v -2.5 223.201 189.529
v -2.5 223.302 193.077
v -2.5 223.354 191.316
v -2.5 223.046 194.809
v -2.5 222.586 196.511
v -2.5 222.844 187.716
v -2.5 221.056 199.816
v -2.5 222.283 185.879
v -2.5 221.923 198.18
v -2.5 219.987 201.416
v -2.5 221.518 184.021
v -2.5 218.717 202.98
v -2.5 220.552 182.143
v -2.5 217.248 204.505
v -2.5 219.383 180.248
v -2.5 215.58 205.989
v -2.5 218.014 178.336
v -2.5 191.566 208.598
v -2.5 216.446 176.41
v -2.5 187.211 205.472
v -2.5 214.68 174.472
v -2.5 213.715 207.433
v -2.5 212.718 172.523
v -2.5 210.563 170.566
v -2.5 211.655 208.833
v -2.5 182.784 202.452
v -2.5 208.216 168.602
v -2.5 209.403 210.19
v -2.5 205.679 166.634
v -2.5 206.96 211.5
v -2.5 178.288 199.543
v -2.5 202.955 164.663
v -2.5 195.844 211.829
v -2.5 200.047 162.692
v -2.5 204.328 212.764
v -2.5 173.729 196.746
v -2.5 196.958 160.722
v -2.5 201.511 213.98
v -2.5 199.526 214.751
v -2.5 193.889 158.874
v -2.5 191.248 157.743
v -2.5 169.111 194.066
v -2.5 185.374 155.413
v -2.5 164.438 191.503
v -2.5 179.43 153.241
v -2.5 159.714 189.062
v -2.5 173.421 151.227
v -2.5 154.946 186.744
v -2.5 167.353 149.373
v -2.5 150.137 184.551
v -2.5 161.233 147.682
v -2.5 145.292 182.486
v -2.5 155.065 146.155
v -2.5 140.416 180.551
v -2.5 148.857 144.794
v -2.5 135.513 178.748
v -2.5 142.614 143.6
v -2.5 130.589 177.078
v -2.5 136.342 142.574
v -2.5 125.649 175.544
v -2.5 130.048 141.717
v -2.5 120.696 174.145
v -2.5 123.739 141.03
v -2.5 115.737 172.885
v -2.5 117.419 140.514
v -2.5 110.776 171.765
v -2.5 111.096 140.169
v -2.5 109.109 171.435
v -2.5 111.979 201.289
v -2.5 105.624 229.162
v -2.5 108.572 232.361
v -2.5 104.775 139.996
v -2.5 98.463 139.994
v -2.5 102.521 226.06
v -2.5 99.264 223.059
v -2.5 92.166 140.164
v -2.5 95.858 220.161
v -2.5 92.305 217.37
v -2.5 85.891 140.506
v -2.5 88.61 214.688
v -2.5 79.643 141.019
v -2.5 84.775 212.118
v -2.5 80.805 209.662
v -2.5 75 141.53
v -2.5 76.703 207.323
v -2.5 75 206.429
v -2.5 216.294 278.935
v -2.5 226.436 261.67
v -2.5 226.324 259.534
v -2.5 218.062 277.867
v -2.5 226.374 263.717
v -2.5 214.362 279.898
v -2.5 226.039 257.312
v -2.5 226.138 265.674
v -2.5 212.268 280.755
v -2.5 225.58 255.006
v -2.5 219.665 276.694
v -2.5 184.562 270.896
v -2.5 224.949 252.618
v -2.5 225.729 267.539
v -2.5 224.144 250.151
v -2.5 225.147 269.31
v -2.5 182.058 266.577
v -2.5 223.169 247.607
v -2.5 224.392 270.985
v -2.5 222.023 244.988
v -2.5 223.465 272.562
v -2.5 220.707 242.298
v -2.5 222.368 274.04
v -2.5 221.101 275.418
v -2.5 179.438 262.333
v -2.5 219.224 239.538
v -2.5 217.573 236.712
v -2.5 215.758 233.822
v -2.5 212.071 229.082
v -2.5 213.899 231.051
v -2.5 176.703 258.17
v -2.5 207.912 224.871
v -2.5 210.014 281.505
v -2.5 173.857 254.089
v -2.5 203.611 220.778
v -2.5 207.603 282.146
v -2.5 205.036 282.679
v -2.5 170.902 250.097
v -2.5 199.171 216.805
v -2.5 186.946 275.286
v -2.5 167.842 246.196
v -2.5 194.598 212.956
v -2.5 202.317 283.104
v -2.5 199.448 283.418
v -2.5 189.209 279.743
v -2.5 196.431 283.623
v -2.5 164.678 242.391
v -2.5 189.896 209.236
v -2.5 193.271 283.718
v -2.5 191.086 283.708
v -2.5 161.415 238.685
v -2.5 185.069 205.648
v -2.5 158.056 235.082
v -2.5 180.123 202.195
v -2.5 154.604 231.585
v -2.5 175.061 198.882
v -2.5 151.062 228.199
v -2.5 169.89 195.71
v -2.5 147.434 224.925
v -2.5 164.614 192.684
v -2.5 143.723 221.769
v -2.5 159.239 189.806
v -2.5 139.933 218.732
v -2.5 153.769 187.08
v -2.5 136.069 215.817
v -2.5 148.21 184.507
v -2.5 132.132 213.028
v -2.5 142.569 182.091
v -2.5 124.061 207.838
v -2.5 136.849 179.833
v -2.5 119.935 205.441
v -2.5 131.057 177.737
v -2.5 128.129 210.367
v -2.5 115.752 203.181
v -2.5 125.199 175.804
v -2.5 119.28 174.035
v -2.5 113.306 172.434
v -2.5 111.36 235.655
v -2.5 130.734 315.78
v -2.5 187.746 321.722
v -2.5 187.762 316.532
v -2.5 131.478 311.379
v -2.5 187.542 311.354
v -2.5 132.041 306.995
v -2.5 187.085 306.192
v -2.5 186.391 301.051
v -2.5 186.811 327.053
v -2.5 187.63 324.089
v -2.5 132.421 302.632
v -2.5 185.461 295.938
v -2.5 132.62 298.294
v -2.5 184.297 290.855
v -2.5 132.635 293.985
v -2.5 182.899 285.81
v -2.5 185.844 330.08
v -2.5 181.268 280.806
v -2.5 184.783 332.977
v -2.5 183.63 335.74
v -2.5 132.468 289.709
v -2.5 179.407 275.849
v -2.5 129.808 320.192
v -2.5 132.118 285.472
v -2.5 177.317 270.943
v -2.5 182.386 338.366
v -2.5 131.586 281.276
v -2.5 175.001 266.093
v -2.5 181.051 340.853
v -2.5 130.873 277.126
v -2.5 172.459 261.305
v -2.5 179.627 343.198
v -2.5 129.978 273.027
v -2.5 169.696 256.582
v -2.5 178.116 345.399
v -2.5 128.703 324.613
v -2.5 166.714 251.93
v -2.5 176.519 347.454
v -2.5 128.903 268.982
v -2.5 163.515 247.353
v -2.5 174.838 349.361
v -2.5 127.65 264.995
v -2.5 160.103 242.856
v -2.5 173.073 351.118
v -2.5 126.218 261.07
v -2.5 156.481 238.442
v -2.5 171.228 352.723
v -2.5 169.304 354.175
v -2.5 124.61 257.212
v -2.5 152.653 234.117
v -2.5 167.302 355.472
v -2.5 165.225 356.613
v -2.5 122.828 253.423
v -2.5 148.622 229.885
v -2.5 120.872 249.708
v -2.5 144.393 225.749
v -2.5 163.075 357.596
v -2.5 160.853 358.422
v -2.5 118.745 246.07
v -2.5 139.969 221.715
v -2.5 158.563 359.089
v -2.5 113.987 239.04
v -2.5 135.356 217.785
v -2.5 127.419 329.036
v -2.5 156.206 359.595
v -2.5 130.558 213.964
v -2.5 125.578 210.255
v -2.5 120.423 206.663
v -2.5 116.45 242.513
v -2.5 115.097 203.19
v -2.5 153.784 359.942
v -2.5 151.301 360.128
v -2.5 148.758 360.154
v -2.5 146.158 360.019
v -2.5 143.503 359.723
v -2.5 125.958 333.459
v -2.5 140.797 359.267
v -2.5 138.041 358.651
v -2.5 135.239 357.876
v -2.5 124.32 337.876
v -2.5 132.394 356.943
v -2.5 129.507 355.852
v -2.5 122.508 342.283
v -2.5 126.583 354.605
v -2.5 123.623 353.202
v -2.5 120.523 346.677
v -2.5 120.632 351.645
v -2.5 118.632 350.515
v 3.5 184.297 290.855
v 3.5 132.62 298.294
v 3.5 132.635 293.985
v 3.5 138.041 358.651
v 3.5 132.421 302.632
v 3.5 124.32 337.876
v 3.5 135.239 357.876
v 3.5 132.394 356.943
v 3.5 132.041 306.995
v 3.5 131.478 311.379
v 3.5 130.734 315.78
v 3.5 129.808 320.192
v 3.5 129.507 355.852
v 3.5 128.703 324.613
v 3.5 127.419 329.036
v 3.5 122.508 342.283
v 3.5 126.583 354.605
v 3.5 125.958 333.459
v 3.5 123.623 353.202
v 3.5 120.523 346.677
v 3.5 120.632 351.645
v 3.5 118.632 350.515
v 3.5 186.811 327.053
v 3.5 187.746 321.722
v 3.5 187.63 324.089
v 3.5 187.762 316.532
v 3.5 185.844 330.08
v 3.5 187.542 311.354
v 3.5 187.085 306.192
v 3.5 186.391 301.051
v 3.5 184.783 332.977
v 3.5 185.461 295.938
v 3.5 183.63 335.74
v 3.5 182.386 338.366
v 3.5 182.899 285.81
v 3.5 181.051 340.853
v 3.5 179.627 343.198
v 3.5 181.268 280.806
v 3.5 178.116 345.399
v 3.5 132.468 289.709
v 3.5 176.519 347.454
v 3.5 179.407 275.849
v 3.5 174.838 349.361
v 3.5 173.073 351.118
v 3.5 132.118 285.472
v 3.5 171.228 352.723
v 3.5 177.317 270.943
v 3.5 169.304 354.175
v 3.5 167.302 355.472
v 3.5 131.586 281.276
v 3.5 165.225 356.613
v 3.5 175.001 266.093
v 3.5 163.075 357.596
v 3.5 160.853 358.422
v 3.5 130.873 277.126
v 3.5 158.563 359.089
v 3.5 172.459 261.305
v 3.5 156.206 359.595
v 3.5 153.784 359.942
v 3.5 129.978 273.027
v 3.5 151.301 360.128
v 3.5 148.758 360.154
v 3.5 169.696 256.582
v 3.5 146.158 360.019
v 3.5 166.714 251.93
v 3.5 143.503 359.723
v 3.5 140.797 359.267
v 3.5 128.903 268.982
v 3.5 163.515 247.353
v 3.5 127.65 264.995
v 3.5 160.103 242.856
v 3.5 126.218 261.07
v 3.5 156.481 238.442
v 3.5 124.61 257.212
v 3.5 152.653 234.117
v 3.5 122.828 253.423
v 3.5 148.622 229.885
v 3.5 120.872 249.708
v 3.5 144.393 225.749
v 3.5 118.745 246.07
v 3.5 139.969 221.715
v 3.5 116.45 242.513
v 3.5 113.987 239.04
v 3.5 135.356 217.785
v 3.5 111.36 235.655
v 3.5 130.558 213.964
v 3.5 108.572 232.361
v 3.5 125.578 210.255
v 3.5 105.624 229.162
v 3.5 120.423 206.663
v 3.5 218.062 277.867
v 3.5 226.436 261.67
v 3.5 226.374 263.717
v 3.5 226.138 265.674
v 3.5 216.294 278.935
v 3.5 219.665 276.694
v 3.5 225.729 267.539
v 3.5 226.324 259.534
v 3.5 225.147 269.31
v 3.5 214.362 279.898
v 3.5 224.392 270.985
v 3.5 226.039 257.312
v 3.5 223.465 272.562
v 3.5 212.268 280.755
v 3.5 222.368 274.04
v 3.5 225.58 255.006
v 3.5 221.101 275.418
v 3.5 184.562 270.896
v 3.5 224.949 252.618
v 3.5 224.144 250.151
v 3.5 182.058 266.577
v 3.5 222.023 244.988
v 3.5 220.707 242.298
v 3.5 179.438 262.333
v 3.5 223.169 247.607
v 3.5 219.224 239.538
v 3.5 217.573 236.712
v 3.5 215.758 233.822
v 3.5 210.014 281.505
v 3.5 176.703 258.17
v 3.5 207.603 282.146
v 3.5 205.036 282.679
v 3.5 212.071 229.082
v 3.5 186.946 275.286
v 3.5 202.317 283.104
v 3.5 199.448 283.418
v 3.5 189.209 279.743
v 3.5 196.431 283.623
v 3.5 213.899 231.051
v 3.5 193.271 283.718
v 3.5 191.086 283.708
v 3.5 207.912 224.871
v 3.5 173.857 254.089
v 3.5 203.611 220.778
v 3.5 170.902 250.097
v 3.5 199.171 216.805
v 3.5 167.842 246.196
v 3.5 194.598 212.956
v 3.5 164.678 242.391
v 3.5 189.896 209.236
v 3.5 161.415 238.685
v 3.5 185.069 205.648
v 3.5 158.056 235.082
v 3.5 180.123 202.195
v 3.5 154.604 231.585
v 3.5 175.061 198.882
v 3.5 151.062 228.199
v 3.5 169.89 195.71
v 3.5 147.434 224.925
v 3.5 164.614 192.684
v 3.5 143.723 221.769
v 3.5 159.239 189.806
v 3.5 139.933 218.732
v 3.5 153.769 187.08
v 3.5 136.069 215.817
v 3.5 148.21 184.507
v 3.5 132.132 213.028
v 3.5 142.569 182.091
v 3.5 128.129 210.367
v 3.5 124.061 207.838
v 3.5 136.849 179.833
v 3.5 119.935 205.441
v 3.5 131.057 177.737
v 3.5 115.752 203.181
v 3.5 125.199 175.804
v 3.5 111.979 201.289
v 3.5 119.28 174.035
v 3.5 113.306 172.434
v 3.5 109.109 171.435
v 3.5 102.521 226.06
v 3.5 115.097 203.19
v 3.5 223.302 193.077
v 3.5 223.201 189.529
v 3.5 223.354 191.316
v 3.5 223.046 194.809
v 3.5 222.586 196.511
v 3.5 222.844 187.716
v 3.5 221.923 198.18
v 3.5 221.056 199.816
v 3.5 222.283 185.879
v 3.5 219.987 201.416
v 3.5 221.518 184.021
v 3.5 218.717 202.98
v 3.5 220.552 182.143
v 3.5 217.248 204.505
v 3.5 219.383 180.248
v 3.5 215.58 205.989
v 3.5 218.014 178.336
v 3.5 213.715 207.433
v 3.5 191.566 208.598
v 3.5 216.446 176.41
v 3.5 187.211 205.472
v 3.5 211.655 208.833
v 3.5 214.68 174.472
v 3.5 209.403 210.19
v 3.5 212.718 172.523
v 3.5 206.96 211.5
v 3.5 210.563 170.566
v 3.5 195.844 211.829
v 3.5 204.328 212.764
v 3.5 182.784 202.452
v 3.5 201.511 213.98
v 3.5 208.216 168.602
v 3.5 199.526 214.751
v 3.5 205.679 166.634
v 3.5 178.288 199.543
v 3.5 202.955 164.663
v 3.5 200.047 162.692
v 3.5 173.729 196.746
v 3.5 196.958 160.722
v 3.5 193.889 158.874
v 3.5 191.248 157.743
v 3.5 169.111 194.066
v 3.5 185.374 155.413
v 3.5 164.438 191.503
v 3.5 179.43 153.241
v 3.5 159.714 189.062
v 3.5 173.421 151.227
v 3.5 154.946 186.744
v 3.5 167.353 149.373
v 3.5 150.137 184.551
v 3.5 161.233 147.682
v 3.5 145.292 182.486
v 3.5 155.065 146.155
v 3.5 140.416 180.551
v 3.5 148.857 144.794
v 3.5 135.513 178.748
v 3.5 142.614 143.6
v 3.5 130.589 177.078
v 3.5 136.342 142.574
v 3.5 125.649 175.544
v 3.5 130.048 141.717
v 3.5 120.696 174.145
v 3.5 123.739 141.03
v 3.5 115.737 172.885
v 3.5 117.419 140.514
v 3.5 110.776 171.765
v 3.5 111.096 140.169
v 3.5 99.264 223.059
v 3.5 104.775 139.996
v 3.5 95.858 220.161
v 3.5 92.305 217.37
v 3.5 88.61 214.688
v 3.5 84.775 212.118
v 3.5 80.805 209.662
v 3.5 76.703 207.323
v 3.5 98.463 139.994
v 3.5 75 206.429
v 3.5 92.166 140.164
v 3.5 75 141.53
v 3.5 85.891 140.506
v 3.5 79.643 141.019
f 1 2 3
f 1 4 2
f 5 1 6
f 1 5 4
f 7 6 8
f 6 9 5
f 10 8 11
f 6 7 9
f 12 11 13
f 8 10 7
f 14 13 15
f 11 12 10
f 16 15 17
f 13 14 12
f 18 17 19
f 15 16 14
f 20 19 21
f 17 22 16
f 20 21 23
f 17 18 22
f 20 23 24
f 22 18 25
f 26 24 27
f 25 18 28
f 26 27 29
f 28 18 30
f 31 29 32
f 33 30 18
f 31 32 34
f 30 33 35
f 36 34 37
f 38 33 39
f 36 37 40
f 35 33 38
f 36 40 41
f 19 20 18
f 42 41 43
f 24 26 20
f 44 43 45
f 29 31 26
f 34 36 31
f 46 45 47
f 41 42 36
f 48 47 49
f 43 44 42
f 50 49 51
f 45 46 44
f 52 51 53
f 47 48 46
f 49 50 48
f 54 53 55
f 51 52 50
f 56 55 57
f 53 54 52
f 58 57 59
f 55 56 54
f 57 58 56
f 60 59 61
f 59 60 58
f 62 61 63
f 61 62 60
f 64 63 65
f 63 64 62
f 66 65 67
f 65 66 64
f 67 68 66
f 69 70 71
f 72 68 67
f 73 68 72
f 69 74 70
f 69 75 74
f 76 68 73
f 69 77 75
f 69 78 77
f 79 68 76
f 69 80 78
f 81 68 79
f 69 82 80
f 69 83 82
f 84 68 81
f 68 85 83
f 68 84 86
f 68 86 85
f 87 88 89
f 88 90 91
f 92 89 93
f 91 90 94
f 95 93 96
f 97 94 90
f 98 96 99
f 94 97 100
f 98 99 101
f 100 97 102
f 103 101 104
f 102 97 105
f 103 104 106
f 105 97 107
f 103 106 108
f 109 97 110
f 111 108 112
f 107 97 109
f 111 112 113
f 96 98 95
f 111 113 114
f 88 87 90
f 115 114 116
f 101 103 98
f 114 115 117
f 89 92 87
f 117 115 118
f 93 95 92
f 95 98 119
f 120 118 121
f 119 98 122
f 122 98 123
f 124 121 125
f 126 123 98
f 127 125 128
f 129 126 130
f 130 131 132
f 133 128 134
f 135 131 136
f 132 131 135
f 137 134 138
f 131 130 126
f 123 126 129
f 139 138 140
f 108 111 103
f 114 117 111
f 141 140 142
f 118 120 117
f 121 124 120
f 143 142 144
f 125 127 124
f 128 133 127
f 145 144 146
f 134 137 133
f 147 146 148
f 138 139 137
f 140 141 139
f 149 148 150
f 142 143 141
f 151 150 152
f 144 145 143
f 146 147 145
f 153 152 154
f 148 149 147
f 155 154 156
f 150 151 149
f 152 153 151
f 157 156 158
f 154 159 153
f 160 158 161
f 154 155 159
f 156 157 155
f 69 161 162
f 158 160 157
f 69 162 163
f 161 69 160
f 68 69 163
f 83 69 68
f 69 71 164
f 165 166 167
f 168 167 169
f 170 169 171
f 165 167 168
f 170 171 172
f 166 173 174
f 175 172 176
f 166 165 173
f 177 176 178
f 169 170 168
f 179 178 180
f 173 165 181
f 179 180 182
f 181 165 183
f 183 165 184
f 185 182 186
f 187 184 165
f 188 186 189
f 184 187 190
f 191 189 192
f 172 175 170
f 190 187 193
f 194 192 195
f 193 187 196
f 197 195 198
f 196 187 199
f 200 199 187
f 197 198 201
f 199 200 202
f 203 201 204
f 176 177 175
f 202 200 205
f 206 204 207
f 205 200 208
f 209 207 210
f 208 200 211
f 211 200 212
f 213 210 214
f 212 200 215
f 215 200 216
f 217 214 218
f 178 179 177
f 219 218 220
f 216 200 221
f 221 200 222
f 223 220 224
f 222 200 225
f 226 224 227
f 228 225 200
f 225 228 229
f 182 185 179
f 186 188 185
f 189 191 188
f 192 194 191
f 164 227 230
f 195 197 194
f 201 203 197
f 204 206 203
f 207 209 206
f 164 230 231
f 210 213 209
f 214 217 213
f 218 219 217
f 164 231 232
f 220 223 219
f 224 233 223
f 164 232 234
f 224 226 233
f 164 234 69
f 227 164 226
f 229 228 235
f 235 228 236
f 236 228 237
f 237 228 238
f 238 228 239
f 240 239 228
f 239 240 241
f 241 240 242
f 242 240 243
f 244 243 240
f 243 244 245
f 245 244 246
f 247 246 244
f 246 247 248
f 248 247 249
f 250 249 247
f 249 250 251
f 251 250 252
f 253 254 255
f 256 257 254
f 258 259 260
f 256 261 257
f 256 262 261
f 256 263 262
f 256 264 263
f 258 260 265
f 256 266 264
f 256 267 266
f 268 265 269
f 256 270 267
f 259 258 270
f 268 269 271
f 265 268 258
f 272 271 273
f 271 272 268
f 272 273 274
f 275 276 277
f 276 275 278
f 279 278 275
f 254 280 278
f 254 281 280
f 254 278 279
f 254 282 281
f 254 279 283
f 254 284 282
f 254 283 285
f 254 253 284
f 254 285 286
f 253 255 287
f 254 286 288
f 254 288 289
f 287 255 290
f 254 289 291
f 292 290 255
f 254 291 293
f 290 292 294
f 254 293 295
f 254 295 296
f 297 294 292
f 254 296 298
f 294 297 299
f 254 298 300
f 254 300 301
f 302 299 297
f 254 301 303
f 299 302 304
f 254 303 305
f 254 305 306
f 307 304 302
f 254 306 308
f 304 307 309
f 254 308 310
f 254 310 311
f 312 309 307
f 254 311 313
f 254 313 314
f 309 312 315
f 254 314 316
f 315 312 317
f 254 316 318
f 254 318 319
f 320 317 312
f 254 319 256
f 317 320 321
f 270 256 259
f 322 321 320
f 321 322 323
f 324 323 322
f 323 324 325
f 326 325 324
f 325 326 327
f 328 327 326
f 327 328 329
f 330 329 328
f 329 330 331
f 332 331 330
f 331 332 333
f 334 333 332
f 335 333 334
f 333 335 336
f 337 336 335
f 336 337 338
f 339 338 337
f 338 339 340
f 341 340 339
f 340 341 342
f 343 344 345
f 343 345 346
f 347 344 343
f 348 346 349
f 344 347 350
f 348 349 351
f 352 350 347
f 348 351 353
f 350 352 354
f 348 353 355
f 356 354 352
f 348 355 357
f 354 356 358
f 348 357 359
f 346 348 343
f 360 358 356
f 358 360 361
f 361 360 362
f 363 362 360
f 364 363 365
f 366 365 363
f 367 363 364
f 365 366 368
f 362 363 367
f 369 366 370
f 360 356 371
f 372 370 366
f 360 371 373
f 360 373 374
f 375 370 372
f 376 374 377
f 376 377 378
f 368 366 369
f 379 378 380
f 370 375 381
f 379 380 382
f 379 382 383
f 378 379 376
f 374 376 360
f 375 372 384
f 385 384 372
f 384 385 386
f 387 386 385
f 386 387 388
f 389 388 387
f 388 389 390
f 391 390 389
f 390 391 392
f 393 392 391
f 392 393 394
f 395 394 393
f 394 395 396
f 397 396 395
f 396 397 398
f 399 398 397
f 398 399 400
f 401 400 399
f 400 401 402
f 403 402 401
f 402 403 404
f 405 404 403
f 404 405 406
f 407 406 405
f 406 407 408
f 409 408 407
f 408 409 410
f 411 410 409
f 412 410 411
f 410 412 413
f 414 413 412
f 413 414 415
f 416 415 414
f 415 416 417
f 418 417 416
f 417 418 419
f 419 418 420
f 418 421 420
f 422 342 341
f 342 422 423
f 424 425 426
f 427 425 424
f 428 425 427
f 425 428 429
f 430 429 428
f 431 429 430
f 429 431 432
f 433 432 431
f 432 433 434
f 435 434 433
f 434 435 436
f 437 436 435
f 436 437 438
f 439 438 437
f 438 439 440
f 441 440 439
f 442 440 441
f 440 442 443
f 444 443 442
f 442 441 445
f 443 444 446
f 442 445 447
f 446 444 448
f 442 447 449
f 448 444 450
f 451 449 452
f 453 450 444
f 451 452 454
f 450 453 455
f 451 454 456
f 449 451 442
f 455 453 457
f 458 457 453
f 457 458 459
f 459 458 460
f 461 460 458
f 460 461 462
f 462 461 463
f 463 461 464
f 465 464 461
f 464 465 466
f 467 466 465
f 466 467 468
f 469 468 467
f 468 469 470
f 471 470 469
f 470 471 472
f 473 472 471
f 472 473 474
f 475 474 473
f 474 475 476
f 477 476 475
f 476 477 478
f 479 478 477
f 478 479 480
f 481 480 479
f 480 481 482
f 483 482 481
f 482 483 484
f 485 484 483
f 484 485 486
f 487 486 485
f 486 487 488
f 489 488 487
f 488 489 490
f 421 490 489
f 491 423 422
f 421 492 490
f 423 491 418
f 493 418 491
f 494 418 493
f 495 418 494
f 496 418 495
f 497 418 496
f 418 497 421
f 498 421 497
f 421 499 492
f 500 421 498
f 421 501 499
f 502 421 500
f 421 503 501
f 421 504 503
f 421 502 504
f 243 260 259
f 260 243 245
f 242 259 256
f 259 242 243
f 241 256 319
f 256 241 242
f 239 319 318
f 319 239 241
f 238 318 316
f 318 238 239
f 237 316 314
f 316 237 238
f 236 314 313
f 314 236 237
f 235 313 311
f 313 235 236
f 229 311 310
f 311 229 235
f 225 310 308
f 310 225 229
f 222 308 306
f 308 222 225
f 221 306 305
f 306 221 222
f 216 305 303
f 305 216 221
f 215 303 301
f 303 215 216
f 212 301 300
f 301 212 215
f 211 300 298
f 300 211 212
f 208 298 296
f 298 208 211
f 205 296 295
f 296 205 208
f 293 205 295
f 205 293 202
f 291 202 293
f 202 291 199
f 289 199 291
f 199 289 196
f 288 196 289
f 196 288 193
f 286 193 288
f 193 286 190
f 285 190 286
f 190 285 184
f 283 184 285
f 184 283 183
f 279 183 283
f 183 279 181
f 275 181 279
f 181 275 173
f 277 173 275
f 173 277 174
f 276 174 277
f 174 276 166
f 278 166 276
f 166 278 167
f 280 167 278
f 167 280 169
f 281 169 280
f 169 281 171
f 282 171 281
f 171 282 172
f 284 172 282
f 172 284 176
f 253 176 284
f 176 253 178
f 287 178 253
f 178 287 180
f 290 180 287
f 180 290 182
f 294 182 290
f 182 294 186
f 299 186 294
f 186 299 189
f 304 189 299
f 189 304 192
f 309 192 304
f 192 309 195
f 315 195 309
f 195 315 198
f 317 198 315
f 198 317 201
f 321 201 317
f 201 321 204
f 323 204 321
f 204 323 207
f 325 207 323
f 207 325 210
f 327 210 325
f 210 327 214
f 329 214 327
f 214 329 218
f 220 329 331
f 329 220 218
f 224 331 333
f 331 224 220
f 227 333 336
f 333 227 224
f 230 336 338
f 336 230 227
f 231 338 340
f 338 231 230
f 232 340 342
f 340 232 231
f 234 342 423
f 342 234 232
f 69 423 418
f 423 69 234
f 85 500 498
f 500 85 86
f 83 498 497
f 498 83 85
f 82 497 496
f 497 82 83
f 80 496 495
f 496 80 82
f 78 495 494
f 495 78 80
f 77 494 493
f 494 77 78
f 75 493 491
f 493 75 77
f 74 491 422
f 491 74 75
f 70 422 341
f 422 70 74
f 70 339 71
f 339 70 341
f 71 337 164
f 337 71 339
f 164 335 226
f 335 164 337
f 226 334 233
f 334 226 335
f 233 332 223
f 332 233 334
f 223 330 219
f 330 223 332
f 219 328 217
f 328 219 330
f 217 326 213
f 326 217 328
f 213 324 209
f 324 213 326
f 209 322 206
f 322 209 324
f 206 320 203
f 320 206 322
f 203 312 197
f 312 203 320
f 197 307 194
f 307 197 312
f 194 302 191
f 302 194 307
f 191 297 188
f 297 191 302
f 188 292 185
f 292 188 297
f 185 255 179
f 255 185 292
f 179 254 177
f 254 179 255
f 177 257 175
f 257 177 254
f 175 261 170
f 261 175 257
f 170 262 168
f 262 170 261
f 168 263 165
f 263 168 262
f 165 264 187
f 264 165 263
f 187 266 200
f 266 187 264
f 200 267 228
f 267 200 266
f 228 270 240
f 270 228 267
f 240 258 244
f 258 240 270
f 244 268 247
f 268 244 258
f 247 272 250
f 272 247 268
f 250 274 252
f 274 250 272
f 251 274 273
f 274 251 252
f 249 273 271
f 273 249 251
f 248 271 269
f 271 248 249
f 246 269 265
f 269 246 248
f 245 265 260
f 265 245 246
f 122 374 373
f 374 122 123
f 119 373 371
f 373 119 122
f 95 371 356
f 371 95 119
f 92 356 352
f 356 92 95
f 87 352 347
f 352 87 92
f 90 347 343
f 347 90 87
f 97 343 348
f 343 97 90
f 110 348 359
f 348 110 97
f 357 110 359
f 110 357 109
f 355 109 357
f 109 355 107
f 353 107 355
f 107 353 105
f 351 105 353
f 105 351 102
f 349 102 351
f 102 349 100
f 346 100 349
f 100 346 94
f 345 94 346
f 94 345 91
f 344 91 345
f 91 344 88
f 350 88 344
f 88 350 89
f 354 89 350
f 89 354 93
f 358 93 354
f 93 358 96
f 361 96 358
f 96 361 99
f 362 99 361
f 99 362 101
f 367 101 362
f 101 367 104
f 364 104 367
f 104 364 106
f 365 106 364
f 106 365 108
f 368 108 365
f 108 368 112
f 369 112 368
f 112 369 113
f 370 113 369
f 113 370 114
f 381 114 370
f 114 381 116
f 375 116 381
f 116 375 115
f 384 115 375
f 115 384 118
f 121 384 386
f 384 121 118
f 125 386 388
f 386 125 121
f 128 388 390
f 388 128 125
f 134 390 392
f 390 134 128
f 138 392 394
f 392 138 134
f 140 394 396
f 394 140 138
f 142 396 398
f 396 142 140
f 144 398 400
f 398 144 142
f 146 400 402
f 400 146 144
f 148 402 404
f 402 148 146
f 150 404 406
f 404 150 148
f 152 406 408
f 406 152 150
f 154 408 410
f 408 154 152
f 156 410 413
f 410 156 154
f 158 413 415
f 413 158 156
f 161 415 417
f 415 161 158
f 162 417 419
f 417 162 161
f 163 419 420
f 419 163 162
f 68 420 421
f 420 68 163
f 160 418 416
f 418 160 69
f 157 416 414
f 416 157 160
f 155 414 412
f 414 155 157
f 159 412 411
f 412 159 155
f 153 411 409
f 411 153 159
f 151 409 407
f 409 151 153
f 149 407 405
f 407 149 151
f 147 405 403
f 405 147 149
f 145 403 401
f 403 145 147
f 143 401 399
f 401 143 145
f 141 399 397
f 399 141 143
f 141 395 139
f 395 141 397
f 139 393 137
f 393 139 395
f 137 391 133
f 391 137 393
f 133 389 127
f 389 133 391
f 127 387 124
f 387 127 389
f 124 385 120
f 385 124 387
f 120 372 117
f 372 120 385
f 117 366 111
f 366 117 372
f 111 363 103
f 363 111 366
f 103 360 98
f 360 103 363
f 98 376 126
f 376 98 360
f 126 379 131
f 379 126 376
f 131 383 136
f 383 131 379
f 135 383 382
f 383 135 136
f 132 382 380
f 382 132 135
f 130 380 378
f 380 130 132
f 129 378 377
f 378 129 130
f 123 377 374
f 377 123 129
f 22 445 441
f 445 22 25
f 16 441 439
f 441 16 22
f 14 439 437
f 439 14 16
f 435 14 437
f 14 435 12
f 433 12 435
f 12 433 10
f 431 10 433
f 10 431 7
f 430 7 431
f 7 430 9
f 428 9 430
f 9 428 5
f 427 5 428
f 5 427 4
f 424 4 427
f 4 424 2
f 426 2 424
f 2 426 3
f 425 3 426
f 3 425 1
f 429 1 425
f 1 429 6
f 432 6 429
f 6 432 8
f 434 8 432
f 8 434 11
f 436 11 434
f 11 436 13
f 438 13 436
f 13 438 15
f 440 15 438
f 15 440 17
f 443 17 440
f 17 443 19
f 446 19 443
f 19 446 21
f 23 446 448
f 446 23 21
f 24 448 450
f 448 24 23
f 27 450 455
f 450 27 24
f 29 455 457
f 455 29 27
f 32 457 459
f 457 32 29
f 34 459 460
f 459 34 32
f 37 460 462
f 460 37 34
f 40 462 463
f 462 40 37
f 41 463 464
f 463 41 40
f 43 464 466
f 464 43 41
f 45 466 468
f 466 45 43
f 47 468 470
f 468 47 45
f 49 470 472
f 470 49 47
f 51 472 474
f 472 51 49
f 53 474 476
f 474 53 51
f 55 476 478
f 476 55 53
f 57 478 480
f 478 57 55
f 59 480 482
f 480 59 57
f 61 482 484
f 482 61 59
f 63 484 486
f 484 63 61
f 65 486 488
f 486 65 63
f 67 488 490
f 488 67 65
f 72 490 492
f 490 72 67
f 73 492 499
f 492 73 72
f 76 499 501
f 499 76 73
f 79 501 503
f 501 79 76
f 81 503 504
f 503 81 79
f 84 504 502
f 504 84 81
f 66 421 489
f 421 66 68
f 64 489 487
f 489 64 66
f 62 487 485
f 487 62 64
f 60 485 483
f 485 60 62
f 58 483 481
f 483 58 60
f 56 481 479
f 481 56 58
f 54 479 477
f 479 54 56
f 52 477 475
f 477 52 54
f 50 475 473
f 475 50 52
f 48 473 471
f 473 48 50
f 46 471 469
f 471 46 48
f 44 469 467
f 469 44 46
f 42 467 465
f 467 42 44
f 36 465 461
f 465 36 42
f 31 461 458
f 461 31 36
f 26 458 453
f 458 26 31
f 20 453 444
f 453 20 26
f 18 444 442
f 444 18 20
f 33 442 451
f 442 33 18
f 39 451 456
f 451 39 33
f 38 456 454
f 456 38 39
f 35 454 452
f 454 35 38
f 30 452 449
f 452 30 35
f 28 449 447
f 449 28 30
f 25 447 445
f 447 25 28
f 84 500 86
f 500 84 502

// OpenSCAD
// file: EschaStaffMaster.scad
PipeDiameter = 28;
PipeRadius = PipeDiameter/2;

module WedgeRemoval45degree()
{
    linear_extrude(height=15)
    {
        polygon([[0,0],[0,1],[1,0]]);
    }
}

module FeatherPrimitive()
{
    mirror([0,1,1])
    rotate([0,-270,0])
linear_extrude(height=6)
{    
intersection()
{
    union()
    {
intersection()
{
    square([100,100]);
    
    
difference()
{
    circle(r=50,center=true,$fn=200);
    scale([0.65,0.85,1]) circle(r=50,center=true,$fn=200);
    
}

}
translate([41.2,0,0]) scale([1,0.75,1]) circle(d=17.5,center=true,$fn=200);
    }
    scale([0.75,0.8,1])circle(r=60,center=true,$fn=200);
    //translate([0,15,0])scale([0.75,0.8,1])circle(r=60,center=true,$fn=200);
    translate([5,46,0])rotate([0,0,45])scale([0.25,0.8,1])circle(r=60,center=true,$fn=200);
}
}
}

module EschaStaffCenterJewel()
{
    difference()
    {
    render()
    {
        minkowski()
        {
            union()
            {
    InnerRadius = PipeRadius+2;
    OuterRadius = PipeRadius+6;
    translate([0,0,-22.5])cylinder(h=25,r1=InnerRadius,r2=OuterRadius,center=true,$fn=200);
    cylinder(h=20,r=OuterRadius,center=true,$fn=200);
    translate([0,0,22.5]) cylinder(h=25,r1=OuterRadius,r2=InnerRadius,center=true,$fn=200); 
            }
            sphere(r=5,$fn=50);
        }
    }
    scale([1.05,1.05,1.05]) EschaStaffCircularHead();
    }
}

module EschaStaffCircularHead()
{
    HeadRadius = 180/2;
    HeadRadiusInner = HeadRadius-8;
    HeadRadiusOuter = HeadRadius+8;
    union()
    {
        difference()
        {
            translate([0,0,HeadRadius-3]) rotate([0,90,0]) cylinder(h=10,r=HeadRadiusOuter,center=true,$fn=256);
            translate([0,0,HeadRadius-3]) rotate([0,90,0]) cylinder(h=10+1,r=HeadRadiusInner,center=true,$fn=256);
            translate([0,HeadRadius-3,HeadRadius-3]) rotate([45,0,0]) cube([20,120,120],center=true);
            translate([0,HeadRadius-3,HeadRadius+40]) rotate([65,0,0]) cube([20,120,120],center=true);
            translate([-6,40,-9]) cube([2,2,60]);
            translate([-6,44,-9]) cube([2,2,60]);
            translate([-6,36,-9]) cube([2,2,60]);
            translate([-6,-40,-9]) cube([2,2,60]);
            translate([-6,-44,-9]) cube([2,2,60]);
            translate([-6,-36,-9]) cube([2,2,60]);
            translate([4,40,-9]) cube([2,2,60]);
            translate([4,44,-9]) cube([2,2,60]);
            translate([4,36,-9]) cube([2,2,60]);
            translate([4,-40,-9]) cube([2,2,60]);
            translate([4,-44,-9]) cube([2,2,60]);
            translate([4,-36,-9]) cube([2,2,60]);
            // Use as a position guide when assembly.
            translate([5.2,0,0]) cube([1,PipeDiameter-1,40],center=true);
        }
        translate([0,64.75,24.5]) rotate([0,90,0]) cylinder(d=16,h=10,center=true,$fn=256);
        translate([0,39,168]) rotate([0,90,0]) cylinder(d=16,h=10,center=true,$fn=256);
        translate([5,-25,-100])
        scale([1,1.5,3]) 
        rotate([90,0,270])
        linear_extrude(height=10)
        {
            intersection()
            {
                difference()
                {
                    circle(r=80,$fn=256);
                    scale([1.2,0.8,1]) circle(r=80,$fn=256);
                    translate([0,-100,0]) square([200,200],center=true);
                    translate([-60,100,0]) square([200,100],center=true);     
                }
                translate([20,45,0]) circle(r=40,$fn=256);
            }
        }
    }
}

module EschaStaffSilverCollar()
{
    InnerRadius = PipeRadius+14;
    OuterRadius = PipeRadius+18;
    difference()
    {
        translate([0,0,-45]) cylinder(h=10,r1=OuterRadius,r2=InnerRadius,$fn=200);
        scale([1.02,1.02,1.02]) EschaStaffCenterJewel();
    }
}

module EschaStaffSilverFlare()
{
    translate([0,0,-53])
    scale([1,1,1.5])
    rotate([0,180,0])
    rotate_extrude($fn=200)
    union()
    {
        translate([40,0,0])circle(r=5);
        translate([0,-5,0])square([40,10]);
        translate([0,5,0])
        difference()
        {
            square([40,90]);
            translate([435,142,0]) circle(r=420,$fn=200);
        }
    }
}

module EschaStaffBlackKnob()
{
    translate([0,0,-216])
    {
        intersection()
        {
            sphere(r=PipeRadius+15,$fn=200);
            cube([2*(PipeRadius+15)+1,2*(PipeRadius+15)+1,1.4*(PipeRadius+15)],center=true);
        }
    }
}

module EschaStaffGoldFlare()
{
    translate([0,0,-283])
    scale([1,1,0.5])
    rotate_extrude($fn=200)
    union()
    {
        difference()
        {
            square([40,90]);
            translate([435,142,0]) circle(r=420,$fn=200);
        }
    }
    
    translate([0,0,-283])
    scale([1,1,1.2])
    rotate([0,180,0])
    rotate_extrude($fn=200)
    union()
    {
        difference()
        {
            square([40,90]);
            translate([435,142,0]) circle(r=420,$fn=200);
        }
    }
}
module EschaStaffSphereUpper()
{
    SphereRadius = 100;
    
    intersection()
    {
        translate([0,0,85]) sphere(d=SphereRadius,$fn=200);
        translate([0,0,185]) cube(200,center=true);
    }
    
    
}

module EschaStaffSphereLower()
{
    SphereRadius = 100;
    difference()
    {
        translate([0,0,85]) sphere(d=SphereRadius,$fn=200);
        translate([0,0,185]) cube(200,center=true);
    }
    
    
}
module EschaStaffFeatherHood()
{
    hull()
    {
        scale([0.4,1,1]) translate([0,-15,150]) rotate([90,0,0]) cylinder(r=10,h=2,center=true,$fn=100);
        scale([0.4,1,1]) translate([0,75,180]) rotate([90,0,0]) cylinder(r=50,h=2,center=true,$fn=100);
    }
    
}
module EschaStaffFerule()
{
   // translate([0,0,-790])
    difference()
    {
    scale([2,2,3])
    rotate_extrude($fn=200)
    {
        translate([10,0,0]) circle(r=5,$fn=200);
        translate([8,7,0]) circle(r=3,$fn=200);
        translate([9,20,0]) circle(r=2,$fn=200);
        translate([5,0,0]) square(10,center=true);
        difference()
        {
            translate([0,-5,0]) square([10,26.88]);
            translate([17,0,0]) scale([0.5,1.5,1]) circle(r=20,$fn=200);
        }
    }
   // cylinder(r=5,h=70,$fn=100,center=true);
    }
}

module EschaStaffFeruleExit()
{
   // translate([0,0,-790])
    {
        cylinder(r=4.8,h=30,$fn=100,center=true);
        translate([0,0,-15]) sphere(r=4.8,$fn=100,center=true);
    }
}

module EschaStaffTopFerule()
{
    difference()
    {
    union()
    {
    translate([0,0,192])
    scale([0.7,0.7,0.7])
    rotate_extrude($fn=200)
    {
        translate([10,0,0]) circle(r=5,$fn=200);
        translate([8,7,0]) circle(r=3,$fn=200);
        translate([8,20,0]) circle(r=2,$fn=200);
        translate([5,0,0]) square(10,center=true);
        difference()
        {
            translate([0,-5,0]) square([10,25]);
            translate([17,0,0]) scale([0.5,1.5,1]) circle(r=20,$fn=200);
        }
    }
    //cylinder(r=5,h=70,$fn=100,center=true);
    
    translate([0,0,182]) 
    {
     
        minkowski()
            {
                cube([20,30,20],center=true);
                sphere(r=3,$fn=50);
            }
    }
    }
    scale([1.05,1.05,1.05]) EschaStaffCircularHead();
    translate([0,0,-15]) scale([1.05,1.05,1.05]) EschaStaffCircularHead();
    scale([1.05,1.05,1.05]) EschaStaffFeatherHood();
    }
}
// main file
include <EschaStaffMaster.scad>;

difference()
{
    scale([1,1.25,1])
union()
{
 
    intersection()
    {
        union()
        {
            translate([-2.5,-42,328]) scale([1,4.2,3.5]) rotate([30,0,0]) FeatherPrimitive();
            translate([-2.5,51,343]) scale([1,3.5,3.7]) rotate([-10,0,0]) FeatherPrimitive();
            translate([-2.5,91,314]) scale([1,3.5,3.7]) rotate([-35,0,0]) FeatherPrimitive();
        }
        translate([0,160,200]) cube([20,200,400],center=true);
    }
}

//translate([0,0,-325]) cylinder(d=PipeDiameter,h=900,center=true,$fn=200);
}
